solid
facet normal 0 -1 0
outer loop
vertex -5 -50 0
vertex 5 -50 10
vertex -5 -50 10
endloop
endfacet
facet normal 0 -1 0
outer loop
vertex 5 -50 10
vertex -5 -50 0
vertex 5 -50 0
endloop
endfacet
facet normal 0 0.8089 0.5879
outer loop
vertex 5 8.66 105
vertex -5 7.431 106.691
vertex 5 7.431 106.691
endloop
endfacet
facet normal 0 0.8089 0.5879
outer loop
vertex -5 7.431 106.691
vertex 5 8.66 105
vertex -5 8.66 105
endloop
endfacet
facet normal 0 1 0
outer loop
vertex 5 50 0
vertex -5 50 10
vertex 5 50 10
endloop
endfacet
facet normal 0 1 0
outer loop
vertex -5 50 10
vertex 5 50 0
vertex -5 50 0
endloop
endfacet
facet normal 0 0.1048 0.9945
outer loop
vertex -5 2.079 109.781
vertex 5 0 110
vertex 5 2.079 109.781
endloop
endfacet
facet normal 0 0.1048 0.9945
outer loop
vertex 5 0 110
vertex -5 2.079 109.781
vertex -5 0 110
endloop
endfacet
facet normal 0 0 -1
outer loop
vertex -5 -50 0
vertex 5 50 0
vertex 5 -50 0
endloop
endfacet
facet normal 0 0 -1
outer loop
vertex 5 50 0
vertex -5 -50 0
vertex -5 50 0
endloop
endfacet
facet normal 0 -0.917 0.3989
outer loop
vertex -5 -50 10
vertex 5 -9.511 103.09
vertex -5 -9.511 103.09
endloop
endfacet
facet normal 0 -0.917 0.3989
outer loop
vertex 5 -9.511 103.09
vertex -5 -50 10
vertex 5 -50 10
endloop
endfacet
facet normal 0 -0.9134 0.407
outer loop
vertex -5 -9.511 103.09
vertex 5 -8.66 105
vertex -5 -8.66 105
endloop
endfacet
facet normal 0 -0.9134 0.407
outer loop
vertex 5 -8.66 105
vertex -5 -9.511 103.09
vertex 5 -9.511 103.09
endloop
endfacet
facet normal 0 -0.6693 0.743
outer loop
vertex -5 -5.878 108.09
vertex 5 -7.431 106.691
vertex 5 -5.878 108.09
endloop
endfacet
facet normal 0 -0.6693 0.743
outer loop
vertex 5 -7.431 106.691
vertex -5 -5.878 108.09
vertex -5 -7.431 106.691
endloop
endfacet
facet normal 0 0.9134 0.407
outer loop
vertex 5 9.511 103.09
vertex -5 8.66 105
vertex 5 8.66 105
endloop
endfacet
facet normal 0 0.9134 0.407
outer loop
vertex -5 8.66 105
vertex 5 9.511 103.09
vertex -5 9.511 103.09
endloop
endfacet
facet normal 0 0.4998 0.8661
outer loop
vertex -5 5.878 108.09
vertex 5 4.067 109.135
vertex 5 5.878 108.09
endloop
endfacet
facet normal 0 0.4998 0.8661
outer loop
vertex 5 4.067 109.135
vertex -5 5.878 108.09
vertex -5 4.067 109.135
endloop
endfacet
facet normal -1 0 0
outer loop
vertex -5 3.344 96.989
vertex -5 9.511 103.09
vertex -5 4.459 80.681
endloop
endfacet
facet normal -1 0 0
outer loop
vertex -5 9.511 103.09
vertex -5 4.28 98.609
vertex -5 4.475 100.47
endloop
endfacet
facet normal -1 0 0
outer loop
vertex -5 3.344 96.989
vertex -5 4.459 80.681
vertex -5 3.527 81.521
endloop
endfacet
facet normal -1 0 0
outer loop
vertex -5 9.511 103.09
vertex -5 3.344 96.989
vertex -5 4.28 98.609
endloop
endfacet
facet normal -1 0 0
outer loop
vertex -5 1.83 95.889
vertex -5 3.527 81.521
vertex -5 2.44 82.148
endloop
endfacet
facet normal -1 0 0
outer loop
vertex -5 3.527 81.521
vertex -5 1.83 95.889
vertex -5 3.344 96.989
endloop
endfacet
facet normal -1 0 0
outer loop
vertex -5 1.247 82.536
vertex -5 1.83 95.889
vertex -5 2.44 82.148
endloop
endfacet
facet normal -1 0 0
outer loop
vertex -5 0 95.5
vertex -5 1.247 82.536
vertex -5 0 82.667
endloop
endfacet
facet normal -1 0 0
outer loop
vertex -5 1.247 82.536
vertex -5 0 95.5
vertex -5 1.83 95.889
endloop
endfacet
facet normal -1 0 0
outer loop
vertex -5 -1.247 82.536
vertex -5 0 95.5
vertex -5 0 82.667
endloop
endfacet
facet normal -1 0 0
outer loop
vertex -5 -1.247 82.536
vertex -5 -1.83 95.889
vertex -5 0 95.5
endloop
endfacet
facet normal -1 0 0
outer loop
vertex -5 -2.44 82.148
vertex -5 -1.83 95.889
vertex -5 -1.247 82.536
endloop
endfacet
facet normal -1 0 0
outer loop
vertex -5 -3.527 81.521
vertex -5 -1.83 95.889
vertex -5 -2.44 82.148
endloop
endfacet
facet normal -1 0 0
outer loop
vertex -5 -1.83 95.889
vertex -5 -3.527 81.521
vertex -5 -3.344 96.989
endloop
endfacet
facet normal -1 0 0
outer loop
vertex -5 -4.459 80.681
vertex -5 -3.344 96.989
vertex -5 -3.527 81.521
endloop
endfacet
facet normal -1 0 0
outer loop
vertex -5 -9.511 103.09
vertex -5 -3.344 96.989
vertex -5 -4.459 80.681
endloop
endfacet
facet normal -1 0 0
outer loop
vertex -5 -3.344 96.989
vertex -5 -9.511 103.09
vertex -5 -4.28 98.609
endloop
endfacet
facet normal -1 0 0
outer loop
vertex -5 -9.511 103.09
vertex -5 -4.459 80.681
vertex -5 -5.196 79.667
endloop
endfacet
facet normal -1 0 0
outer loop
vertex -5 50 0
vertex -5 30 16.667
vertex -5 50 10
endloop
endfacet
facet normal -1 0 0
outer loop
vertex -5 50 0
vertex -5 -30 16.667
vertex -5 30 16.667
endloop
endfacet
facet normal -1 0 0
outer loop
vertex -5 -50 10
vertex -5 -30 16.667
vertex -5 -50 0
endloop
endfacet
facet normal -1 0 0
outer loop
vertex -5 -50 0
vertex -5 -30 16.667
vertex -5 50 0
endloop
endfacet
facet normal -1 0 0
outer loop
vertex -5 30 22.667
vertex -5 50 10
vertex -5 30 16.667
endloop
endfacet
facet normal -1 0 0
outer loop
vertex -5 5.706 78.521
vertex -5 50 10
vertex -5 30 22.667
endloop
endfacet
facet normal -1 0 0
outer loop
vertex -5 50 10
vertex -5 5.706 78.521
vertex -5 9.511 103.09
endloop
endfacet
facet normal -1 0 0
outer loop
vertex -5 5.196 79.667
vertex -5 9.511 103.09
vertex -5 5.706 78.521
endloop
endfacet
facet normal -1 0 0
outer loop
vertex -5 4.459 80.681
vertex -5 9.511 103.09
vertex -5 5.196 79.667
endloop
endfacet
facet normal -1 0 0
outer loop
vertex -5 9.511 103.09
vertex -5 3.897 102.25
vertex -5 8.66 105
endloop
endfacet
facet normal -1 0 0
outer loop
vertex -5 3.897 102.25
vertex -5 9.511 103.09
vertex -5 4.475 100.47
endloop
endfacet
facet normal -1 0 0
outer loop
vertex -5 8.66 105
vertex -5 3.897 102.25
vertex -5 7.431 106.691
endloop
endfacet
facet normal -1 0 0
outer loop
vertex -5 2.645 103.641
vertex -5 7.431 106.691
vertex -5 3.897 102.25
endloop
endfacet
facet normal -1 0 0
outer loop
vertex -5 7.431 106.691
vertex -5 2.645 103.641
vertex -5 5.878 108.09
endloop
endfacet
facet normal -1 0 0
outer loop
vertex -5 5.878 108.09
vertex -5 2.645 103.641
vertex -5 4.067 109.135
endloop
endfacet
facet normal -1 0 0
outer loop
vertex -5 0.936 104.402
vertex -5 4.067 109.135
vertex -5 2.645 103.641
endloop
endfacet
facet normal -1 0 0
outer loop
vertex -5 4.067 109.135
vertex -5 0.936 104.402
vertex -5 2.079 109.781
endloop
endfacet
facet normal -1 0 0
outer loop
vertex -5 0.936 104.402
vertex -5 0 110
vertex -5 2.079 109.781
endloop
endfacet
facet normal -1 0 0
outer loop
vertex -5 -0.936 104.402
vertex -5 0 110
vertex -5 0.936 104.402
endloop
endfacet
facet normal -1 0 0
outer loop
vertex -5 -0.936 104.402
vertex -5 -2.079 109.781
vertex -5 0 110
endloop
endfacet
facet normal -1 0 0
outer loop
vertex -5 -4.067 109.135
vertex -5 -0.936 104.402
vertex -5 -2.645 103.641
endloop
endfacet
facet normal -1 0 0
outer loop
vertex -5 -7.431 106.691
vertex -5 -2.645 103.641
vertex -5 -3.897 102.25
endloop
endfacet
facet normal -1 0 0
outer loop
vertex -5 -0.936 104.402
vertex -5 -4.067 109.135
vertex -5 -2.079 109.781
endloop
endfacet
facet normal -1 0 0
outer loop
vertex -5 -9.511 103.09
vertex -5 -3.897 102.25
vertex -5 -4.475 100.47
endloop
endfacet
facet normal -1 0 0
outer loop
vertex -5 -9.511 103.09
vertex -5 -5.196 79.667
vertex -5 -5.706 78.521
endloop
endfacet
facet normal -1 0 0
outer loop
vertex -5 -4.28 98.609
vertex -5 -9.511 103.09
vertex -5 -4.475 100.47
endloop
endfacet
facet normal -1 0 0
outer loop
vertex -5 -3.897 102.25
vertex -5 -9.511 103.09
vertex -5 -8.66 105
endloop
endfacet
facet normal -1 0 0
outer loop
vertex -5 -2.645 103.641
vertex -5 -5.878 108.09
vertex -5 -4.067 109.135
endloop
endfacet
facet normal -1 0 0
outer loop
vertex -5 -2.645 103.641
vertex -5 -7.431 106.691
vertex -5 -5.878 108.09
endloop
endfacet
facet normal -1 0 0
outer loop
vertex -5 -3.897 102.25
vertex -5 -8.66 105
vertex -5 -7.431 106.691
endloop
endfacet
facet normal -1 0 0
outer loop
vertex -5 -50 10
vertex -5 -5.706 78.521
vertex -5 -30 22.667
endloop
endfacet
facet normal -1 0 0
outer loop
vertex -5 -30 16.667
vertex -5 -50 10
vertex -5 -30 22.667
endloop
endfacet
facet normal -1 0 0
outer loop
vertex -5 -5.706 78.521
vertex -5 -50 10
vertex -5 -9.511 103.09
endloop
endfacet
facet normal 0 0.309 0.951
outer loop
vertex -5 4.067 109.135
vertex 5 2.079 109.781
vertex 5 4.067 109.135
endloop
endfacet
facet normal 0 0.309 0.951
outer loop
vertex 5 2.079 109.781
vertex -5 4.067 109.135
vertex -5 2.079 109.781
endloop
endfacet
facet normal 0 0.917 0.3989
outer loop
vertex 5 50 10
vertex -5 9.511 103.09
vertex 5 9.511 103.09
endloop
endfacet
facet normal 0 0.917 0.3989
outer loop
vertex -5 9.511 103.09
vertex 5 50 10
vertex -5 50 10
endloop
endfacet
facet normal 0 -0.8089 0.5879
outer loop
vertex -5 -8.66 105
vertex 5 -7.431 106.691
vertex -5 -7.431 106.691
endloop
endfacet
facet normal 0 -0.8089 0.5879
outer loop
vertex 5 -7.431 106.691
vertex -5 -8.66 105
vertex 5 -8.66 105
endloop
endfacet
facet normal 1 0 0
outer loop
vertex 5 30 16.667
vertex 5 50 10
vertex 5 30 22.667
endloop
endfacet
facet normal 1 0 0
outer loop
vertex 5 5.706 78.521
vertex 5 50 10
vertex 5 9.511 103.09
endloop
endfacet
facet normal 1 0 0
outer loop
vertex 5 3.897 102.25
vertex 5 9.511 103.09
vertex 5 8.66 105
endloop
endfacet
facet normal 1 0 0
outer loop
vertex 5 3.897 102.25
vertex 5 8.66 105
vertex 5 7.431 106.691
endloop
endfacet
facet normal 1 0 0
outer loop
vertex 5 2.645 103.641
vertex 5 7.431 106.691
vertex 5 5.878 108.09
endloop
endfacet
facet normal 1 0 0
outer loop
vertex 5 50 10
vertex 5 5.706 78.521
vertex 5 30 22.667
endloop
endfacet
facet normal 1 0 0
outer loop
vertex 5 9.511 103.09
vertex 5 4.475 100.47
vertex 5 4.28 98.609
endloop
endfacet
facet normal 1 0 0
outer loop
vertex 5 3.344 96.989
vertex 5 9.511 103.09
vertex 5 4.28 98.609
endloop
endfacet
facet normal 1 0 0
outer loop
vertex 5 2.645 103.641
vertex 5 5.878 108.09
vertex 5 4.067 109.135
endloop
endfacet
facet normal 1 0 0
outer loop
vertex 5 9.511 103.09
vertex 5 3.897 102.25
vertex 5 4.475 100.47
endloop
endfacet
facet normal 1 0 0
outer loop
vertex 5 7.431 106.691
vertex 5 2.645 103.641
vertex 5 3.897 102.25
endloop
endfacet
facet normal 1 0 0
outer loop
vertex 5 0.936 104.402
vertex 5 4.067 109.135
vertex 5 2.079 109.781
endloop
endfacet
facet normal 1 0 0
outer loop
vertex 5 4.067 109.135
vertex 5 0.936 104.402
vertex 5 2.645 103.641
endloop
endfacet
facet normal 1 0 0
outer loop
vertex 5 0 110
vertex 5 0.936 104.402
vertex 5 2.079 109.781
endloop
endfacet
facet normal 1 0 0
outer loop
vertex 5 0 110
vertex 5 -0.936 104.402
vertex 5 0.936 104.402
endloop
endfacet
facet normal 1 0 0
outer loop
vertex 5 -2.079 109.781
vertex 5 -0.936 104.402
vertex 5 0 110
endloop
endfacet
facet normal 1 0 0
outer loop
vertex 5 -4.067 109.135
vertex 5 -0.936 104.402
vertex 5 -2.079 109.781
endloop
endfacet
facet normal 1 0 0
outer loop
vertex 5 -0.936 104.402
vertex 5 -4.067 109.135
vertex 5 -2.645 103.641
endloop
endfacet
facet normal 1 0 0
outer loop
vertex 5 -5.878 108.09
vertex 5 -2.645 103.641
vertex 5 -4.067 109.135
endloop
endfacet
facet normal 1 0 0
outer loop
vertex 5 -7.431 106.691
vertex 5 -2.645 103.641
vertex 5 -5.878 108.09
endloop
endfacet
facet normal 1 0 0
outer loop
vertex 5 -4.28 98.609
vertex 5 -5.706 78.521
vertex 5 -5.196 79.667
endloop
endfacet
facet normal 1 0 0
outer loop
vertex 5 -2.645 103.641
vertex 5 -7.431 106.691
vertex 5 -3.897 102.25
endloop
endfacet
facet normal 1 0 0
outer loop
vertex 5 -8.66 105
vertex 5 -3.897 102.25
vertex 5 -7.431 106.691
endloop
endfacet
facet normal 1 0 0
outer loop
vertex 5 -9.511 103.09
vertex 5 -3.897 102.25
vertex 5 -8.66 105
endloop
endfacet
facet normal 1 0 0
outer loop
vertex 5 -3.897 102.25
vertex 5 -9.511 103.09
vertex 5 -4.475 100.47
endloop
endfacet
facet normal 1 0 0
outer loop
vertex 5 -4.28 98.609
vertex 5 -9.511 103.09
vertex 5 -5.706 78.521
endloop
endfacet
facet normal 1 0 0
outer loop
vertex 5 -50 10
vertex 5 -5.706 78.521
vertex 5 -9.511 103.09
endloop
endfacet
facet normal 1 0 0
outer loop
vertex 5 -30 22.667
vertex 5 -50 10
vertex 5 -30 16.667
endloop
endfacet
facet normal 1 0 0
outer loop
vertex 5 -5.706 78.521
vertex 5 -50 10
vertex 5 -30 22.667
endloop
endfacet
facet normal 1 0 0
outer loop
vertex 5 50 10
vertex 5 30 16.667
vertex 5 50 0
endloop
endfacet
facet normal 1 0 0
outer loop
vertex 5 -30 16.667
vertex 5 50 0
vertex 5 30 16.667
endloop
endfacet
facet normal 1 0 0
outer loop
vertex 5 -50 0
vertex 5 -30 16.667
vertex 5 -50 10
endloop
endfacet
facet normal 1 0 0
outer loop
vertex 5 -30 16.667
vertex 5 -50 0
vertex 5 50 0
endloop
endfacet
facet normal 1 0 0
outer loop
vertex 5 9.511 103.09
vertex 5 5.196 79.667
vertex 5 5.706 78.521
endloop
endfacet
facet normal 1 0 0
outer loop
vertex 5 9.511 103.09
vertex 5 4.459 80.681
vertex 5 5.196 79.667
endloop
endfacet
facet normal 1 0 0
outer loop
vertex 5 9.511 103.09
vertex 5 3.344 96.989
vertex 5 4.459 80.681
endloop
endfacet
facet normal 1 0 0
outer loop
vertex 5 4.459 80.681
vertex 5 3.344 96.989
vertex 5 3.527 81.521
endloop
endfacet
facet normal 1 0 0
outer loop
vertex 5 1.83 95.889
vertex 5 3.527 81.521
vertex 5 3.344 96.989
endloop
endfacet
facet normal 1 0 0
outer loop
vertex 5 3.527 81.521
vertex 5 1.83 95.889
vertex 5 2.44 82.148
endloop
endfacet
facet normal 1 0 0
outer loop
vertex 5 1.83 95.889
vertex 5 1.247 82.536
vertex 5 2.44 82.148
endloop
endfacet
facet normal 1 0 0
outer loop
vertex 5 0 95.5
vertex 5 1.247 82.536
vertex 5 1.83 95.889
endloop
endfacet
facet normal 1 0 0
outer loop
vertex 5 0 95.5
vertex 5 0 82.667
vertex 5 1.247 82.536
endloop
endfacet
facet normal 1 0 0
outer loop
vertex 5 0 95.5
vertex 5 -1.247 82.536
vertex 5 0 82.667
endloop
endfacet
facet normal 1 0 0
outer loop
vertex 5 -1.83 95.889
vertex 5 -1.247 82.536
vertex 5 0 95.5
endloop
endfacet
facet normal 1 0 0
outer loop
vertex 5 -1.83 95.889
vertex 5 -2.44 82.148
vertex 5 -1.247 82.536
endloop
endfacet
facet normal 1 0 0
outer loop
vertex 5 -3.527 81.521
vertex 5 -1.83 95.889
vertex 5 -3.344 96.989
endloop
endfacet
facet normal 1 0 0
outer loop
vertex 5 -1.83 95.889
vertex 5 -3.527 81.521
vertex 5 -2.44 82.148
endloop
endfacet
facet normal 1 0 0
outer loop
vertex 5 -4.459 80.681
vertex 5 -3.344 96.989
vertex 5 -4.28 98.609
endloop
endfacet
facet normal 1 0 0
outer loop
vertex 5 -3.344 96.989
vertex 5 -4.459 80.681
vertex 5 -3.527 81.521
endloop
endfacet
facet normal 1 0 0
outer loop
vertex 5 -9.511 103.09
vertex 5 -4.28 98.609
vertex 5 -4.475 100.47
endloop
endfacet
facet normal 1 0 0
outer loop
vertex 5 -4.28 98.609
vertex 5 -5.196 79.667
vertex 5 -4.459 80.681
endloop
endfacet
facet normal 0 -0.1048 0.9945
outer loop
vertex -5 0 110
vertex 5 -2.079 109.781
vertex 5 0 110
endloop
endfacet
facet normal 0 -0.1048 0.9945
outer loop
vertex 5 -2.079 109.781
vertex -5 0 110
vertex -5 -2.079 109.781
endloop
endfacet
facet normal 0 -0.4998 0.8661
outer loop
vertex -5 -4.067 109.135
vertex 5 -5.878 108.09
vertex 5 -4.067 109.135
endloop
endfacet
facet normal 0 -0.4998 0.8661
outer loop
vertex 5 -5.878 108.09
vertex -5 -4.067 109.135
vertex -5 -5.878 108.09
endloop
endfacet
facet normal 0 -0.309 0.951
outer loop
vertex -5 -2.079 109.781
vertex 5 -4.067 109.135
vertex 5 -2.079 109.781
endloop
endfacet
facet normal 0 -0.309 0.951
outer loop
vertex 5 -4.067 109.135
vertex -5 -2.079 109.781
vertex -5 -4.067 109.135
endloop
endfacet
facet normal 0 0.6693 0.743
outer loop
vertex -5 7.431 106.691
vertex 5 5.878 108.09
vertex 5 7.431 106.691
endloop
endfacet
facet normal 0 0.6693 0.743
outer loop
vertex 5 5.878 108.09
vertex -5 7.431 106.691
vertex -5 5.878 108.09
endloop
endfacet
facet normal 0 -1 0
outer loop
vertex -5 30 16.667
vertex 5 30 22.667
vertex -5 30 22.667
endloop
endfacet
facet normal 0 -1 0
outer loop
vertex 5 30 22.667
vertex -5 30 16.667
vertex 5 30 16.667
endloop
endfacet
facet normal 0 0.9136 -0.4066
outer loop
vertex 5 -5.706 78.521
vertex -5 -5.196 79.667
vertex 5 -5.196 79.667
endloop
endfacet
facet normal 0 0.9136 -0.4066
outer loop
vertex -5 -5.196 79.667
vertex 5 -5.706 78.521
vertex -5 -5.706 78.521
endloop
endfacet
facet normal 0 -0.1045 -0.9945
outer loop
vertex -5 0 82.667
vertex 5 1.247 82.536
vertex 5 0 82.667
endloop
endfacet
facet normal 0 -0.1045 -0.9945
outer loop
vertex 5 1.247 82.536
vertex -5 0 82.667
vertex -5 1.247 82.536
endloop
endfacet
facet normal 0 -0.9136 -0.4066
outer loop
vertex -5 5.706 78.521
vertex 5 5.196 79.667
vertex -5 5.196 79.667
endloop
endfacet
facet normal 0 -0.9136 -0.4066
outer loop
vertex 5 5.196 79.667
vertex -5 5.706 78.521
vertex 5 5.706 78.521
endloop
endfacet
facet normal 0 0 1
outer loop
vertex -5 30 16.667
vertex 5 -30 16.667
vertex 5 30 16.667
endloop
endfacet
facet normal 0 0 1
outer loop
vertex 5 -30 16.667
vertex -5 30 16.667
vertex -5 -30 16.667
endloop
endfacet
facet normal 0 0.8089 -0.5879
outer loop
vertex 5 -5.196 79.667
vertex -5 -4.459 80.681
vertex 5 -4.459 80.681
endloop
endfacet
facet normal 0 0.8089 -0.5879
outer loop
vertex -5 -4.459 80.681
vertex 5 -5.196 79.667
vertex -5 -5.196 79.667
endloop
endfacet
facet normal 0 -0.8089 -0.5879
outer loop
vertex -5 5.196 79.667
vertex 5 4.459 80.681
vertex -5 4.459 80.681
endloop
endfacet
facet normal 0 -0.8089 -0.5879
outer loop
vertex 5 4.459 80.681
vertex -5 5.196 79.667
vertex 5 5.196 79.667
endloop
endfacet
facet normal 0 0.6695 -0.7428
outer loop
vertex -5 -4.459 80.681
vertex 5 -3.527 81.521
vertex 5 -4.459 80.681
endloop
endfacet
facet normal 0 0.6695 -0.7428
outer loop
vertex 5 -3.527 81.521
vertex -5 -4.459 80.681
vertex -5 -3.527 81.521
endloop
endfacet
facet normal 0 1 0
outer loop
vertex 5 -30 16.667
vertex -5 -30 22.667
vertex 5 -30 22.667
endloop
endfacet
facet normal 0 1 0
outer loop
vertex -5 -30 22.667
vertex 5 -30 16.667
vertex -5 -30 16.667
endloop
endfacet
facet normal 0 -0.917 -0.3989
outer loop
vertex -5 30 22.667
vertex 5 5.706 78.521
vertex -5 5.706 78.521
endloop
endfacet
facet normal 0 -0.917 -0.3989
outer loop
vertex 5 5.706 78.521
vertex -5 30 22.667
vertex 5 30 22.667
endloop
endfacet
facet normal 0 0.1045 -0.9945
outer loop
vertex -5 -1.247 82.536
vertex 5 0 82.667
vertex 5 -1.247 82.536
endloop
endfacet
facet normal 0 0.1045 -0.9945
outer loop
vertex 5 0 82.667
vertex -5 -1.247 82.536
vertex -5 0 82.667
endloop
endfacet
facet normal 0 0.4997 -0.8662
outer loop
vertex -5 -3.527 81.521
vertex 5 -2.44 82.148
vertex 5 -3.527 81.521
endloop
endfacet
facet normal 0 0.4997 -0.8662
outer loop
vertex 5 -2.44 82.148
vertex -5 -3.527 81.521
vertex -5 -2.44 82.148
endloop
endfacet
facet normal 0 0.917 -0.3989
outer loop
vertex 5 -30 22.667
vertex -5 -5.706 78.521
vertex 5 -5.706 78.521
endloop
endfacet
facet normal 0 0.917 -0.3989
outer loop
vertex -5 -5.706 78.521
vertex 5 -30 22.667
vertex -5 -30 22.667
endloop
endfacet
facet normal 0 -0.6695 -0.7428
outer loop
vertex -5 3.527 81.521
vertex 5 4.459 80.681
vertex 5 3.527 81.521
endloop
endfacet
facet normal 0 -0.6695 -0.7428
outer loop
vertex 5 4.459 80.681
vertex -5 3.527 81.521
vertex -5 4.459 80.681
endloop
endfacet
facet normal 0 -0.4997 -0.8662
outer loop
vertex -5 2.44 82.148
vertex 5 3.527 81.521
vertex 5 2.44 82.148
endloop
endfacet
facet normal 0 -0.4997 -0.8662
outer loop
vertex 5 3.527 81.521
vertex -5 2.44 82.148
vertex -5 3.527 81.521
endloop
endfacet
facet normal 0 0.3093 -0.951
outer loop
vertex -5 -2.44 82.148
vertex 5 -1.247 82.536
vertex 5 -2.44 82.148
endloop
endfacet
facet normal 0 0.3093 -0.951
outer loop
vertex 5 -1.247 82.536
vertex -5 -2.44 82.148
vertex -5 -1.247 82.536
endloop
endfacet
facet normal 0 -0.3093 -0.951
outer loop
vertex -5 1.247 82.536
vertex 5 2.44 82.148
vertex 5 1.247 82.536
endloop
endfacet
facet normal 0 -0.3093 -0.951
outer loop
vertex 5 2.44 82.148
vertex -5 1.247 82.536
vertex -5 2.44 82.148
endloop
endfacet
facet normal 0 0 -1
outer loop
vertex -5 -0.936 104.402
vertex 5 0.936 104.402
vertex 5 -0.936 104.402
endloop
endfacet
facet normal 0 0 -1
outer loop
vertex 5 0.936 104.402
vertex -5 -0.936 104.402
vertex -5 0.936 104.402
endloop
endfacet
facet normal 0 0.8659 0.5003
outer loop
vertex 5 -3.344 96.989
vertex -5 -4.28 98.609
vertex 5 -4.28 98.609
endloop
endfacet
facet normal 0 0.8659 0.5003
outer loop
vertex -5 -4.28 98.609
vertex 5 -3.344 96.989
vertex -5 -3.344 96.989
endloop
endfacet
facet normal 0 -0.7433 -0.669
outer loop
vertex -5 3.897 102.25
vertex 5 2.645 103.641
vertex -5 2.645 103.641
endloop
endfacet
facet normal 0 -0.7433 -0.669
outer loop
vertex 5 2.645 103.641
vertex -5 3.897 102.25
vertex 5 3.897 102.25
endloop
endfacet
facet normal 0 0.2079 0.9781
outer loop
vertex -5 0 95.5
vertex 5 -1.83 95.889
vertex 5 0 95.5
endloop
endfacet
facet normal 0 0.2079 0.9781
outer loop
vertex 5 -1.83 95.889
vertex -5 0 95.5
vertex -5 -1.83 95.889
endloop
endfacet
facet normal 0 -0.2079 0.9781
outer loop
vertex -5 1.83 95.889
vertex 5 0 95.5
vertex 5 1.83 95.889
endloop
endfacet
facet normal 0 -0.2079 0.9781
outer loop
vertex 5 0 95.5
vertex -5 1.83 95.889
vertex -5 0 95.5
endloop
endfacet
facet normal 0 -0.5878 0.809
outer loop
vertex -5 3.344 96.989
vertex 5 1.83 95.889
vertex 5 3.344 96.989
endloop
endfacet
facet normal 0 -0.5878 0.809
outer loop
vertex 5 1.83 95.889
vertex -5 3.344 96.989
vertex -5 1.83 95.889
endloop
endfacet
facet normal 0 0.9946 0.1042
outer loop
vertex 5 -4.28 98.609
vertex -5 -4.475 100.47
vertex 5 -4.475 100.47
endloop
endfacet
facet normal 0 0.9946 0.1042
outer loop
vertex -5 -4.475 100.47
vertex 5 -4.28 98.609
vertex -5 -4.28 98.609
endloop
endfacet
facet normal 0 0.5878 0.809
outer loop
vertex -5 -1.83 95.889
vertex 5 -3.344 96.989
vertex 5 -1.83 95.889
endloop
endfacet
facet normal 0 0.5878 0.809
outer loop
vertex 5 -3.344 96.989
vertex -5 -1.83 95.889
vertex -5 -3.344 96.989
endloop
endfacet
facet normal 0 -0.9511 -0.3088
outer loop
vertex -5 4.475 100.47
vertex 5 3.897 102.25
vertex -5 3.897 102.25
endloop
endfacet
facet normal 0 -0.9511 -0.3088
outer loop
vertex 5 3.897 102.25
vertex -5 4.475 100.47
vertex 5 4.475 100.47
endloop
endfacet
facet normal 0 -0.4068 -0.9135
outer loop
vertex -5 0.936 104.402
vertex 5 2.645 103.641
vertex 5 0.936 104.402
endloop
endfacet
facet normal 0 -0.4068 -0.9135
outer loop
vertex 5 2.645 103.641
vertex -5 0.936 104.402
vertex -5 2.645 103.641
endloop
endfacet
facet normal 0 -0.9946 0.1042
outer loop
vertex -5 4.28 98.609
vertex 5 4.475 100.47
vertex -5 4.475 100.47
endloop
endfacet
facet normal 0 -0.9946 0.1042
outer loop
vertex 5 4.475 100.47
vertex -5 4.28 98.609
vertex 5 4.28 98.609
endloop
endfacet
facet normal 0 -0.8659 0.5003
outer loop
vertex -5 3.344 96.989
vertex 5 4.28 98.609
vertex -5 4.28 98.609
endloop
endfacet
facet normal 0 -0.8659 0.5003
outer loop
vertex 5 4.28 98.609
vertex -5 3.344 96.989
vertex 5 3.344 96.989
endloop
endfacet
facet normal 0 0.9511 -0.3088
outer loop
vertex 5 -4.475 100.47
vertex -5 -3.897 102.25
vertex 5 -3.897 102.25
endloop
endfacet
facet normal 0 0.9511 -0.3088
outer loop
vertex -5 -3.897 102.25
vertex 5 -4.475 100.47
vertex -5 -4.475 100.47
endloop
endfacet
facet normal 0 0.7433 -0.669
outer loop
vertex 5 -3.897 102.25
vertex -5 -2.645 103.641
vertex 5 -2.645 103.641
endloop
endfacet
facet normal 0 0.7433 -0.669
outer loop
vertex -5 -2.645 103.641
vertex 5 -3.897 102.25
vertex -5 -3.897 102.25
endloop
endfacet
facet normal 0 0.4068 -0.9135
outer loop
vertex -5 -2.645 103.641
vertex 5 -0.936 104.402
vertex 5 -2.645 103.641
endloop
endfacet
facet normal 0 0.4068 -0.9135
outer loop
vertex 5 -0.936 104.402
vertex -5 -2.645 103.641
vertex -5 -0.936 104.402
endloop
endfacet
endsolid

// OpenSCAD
r_rod = 4+0.5;

spool_width = 75;
r_spool = 100;

t_stand = 10;

vertical(w = r_spool, h = r_spool, t = t_stand);

module vertical(w, h, t) {
  difference() {
    // outer fram
    hull() {
      translate([0, 0, t/2]) cube([t, w, t], center = true);
      translate([0, 0, h]) rotate([0, 90, 0]) cylinder(h = t, r = t, center = true);
    }

    // inner cutout
    #translate([0, 0, h/6]) scale([2, 0.6, 0.6]) hull() {
      translate([0, 0, t/2]) cube([t, w, t], center = true);
      translate([0, 0, h]) rotate([0, 90, 0]) cylinder(h = t, r = t, center = true);
    }

    // rod hole
    #translate([0, 0, h]) rotate([0, 90, 0]) cylinder(h = 2*t, r = r_rod, center = true);
  }
}
